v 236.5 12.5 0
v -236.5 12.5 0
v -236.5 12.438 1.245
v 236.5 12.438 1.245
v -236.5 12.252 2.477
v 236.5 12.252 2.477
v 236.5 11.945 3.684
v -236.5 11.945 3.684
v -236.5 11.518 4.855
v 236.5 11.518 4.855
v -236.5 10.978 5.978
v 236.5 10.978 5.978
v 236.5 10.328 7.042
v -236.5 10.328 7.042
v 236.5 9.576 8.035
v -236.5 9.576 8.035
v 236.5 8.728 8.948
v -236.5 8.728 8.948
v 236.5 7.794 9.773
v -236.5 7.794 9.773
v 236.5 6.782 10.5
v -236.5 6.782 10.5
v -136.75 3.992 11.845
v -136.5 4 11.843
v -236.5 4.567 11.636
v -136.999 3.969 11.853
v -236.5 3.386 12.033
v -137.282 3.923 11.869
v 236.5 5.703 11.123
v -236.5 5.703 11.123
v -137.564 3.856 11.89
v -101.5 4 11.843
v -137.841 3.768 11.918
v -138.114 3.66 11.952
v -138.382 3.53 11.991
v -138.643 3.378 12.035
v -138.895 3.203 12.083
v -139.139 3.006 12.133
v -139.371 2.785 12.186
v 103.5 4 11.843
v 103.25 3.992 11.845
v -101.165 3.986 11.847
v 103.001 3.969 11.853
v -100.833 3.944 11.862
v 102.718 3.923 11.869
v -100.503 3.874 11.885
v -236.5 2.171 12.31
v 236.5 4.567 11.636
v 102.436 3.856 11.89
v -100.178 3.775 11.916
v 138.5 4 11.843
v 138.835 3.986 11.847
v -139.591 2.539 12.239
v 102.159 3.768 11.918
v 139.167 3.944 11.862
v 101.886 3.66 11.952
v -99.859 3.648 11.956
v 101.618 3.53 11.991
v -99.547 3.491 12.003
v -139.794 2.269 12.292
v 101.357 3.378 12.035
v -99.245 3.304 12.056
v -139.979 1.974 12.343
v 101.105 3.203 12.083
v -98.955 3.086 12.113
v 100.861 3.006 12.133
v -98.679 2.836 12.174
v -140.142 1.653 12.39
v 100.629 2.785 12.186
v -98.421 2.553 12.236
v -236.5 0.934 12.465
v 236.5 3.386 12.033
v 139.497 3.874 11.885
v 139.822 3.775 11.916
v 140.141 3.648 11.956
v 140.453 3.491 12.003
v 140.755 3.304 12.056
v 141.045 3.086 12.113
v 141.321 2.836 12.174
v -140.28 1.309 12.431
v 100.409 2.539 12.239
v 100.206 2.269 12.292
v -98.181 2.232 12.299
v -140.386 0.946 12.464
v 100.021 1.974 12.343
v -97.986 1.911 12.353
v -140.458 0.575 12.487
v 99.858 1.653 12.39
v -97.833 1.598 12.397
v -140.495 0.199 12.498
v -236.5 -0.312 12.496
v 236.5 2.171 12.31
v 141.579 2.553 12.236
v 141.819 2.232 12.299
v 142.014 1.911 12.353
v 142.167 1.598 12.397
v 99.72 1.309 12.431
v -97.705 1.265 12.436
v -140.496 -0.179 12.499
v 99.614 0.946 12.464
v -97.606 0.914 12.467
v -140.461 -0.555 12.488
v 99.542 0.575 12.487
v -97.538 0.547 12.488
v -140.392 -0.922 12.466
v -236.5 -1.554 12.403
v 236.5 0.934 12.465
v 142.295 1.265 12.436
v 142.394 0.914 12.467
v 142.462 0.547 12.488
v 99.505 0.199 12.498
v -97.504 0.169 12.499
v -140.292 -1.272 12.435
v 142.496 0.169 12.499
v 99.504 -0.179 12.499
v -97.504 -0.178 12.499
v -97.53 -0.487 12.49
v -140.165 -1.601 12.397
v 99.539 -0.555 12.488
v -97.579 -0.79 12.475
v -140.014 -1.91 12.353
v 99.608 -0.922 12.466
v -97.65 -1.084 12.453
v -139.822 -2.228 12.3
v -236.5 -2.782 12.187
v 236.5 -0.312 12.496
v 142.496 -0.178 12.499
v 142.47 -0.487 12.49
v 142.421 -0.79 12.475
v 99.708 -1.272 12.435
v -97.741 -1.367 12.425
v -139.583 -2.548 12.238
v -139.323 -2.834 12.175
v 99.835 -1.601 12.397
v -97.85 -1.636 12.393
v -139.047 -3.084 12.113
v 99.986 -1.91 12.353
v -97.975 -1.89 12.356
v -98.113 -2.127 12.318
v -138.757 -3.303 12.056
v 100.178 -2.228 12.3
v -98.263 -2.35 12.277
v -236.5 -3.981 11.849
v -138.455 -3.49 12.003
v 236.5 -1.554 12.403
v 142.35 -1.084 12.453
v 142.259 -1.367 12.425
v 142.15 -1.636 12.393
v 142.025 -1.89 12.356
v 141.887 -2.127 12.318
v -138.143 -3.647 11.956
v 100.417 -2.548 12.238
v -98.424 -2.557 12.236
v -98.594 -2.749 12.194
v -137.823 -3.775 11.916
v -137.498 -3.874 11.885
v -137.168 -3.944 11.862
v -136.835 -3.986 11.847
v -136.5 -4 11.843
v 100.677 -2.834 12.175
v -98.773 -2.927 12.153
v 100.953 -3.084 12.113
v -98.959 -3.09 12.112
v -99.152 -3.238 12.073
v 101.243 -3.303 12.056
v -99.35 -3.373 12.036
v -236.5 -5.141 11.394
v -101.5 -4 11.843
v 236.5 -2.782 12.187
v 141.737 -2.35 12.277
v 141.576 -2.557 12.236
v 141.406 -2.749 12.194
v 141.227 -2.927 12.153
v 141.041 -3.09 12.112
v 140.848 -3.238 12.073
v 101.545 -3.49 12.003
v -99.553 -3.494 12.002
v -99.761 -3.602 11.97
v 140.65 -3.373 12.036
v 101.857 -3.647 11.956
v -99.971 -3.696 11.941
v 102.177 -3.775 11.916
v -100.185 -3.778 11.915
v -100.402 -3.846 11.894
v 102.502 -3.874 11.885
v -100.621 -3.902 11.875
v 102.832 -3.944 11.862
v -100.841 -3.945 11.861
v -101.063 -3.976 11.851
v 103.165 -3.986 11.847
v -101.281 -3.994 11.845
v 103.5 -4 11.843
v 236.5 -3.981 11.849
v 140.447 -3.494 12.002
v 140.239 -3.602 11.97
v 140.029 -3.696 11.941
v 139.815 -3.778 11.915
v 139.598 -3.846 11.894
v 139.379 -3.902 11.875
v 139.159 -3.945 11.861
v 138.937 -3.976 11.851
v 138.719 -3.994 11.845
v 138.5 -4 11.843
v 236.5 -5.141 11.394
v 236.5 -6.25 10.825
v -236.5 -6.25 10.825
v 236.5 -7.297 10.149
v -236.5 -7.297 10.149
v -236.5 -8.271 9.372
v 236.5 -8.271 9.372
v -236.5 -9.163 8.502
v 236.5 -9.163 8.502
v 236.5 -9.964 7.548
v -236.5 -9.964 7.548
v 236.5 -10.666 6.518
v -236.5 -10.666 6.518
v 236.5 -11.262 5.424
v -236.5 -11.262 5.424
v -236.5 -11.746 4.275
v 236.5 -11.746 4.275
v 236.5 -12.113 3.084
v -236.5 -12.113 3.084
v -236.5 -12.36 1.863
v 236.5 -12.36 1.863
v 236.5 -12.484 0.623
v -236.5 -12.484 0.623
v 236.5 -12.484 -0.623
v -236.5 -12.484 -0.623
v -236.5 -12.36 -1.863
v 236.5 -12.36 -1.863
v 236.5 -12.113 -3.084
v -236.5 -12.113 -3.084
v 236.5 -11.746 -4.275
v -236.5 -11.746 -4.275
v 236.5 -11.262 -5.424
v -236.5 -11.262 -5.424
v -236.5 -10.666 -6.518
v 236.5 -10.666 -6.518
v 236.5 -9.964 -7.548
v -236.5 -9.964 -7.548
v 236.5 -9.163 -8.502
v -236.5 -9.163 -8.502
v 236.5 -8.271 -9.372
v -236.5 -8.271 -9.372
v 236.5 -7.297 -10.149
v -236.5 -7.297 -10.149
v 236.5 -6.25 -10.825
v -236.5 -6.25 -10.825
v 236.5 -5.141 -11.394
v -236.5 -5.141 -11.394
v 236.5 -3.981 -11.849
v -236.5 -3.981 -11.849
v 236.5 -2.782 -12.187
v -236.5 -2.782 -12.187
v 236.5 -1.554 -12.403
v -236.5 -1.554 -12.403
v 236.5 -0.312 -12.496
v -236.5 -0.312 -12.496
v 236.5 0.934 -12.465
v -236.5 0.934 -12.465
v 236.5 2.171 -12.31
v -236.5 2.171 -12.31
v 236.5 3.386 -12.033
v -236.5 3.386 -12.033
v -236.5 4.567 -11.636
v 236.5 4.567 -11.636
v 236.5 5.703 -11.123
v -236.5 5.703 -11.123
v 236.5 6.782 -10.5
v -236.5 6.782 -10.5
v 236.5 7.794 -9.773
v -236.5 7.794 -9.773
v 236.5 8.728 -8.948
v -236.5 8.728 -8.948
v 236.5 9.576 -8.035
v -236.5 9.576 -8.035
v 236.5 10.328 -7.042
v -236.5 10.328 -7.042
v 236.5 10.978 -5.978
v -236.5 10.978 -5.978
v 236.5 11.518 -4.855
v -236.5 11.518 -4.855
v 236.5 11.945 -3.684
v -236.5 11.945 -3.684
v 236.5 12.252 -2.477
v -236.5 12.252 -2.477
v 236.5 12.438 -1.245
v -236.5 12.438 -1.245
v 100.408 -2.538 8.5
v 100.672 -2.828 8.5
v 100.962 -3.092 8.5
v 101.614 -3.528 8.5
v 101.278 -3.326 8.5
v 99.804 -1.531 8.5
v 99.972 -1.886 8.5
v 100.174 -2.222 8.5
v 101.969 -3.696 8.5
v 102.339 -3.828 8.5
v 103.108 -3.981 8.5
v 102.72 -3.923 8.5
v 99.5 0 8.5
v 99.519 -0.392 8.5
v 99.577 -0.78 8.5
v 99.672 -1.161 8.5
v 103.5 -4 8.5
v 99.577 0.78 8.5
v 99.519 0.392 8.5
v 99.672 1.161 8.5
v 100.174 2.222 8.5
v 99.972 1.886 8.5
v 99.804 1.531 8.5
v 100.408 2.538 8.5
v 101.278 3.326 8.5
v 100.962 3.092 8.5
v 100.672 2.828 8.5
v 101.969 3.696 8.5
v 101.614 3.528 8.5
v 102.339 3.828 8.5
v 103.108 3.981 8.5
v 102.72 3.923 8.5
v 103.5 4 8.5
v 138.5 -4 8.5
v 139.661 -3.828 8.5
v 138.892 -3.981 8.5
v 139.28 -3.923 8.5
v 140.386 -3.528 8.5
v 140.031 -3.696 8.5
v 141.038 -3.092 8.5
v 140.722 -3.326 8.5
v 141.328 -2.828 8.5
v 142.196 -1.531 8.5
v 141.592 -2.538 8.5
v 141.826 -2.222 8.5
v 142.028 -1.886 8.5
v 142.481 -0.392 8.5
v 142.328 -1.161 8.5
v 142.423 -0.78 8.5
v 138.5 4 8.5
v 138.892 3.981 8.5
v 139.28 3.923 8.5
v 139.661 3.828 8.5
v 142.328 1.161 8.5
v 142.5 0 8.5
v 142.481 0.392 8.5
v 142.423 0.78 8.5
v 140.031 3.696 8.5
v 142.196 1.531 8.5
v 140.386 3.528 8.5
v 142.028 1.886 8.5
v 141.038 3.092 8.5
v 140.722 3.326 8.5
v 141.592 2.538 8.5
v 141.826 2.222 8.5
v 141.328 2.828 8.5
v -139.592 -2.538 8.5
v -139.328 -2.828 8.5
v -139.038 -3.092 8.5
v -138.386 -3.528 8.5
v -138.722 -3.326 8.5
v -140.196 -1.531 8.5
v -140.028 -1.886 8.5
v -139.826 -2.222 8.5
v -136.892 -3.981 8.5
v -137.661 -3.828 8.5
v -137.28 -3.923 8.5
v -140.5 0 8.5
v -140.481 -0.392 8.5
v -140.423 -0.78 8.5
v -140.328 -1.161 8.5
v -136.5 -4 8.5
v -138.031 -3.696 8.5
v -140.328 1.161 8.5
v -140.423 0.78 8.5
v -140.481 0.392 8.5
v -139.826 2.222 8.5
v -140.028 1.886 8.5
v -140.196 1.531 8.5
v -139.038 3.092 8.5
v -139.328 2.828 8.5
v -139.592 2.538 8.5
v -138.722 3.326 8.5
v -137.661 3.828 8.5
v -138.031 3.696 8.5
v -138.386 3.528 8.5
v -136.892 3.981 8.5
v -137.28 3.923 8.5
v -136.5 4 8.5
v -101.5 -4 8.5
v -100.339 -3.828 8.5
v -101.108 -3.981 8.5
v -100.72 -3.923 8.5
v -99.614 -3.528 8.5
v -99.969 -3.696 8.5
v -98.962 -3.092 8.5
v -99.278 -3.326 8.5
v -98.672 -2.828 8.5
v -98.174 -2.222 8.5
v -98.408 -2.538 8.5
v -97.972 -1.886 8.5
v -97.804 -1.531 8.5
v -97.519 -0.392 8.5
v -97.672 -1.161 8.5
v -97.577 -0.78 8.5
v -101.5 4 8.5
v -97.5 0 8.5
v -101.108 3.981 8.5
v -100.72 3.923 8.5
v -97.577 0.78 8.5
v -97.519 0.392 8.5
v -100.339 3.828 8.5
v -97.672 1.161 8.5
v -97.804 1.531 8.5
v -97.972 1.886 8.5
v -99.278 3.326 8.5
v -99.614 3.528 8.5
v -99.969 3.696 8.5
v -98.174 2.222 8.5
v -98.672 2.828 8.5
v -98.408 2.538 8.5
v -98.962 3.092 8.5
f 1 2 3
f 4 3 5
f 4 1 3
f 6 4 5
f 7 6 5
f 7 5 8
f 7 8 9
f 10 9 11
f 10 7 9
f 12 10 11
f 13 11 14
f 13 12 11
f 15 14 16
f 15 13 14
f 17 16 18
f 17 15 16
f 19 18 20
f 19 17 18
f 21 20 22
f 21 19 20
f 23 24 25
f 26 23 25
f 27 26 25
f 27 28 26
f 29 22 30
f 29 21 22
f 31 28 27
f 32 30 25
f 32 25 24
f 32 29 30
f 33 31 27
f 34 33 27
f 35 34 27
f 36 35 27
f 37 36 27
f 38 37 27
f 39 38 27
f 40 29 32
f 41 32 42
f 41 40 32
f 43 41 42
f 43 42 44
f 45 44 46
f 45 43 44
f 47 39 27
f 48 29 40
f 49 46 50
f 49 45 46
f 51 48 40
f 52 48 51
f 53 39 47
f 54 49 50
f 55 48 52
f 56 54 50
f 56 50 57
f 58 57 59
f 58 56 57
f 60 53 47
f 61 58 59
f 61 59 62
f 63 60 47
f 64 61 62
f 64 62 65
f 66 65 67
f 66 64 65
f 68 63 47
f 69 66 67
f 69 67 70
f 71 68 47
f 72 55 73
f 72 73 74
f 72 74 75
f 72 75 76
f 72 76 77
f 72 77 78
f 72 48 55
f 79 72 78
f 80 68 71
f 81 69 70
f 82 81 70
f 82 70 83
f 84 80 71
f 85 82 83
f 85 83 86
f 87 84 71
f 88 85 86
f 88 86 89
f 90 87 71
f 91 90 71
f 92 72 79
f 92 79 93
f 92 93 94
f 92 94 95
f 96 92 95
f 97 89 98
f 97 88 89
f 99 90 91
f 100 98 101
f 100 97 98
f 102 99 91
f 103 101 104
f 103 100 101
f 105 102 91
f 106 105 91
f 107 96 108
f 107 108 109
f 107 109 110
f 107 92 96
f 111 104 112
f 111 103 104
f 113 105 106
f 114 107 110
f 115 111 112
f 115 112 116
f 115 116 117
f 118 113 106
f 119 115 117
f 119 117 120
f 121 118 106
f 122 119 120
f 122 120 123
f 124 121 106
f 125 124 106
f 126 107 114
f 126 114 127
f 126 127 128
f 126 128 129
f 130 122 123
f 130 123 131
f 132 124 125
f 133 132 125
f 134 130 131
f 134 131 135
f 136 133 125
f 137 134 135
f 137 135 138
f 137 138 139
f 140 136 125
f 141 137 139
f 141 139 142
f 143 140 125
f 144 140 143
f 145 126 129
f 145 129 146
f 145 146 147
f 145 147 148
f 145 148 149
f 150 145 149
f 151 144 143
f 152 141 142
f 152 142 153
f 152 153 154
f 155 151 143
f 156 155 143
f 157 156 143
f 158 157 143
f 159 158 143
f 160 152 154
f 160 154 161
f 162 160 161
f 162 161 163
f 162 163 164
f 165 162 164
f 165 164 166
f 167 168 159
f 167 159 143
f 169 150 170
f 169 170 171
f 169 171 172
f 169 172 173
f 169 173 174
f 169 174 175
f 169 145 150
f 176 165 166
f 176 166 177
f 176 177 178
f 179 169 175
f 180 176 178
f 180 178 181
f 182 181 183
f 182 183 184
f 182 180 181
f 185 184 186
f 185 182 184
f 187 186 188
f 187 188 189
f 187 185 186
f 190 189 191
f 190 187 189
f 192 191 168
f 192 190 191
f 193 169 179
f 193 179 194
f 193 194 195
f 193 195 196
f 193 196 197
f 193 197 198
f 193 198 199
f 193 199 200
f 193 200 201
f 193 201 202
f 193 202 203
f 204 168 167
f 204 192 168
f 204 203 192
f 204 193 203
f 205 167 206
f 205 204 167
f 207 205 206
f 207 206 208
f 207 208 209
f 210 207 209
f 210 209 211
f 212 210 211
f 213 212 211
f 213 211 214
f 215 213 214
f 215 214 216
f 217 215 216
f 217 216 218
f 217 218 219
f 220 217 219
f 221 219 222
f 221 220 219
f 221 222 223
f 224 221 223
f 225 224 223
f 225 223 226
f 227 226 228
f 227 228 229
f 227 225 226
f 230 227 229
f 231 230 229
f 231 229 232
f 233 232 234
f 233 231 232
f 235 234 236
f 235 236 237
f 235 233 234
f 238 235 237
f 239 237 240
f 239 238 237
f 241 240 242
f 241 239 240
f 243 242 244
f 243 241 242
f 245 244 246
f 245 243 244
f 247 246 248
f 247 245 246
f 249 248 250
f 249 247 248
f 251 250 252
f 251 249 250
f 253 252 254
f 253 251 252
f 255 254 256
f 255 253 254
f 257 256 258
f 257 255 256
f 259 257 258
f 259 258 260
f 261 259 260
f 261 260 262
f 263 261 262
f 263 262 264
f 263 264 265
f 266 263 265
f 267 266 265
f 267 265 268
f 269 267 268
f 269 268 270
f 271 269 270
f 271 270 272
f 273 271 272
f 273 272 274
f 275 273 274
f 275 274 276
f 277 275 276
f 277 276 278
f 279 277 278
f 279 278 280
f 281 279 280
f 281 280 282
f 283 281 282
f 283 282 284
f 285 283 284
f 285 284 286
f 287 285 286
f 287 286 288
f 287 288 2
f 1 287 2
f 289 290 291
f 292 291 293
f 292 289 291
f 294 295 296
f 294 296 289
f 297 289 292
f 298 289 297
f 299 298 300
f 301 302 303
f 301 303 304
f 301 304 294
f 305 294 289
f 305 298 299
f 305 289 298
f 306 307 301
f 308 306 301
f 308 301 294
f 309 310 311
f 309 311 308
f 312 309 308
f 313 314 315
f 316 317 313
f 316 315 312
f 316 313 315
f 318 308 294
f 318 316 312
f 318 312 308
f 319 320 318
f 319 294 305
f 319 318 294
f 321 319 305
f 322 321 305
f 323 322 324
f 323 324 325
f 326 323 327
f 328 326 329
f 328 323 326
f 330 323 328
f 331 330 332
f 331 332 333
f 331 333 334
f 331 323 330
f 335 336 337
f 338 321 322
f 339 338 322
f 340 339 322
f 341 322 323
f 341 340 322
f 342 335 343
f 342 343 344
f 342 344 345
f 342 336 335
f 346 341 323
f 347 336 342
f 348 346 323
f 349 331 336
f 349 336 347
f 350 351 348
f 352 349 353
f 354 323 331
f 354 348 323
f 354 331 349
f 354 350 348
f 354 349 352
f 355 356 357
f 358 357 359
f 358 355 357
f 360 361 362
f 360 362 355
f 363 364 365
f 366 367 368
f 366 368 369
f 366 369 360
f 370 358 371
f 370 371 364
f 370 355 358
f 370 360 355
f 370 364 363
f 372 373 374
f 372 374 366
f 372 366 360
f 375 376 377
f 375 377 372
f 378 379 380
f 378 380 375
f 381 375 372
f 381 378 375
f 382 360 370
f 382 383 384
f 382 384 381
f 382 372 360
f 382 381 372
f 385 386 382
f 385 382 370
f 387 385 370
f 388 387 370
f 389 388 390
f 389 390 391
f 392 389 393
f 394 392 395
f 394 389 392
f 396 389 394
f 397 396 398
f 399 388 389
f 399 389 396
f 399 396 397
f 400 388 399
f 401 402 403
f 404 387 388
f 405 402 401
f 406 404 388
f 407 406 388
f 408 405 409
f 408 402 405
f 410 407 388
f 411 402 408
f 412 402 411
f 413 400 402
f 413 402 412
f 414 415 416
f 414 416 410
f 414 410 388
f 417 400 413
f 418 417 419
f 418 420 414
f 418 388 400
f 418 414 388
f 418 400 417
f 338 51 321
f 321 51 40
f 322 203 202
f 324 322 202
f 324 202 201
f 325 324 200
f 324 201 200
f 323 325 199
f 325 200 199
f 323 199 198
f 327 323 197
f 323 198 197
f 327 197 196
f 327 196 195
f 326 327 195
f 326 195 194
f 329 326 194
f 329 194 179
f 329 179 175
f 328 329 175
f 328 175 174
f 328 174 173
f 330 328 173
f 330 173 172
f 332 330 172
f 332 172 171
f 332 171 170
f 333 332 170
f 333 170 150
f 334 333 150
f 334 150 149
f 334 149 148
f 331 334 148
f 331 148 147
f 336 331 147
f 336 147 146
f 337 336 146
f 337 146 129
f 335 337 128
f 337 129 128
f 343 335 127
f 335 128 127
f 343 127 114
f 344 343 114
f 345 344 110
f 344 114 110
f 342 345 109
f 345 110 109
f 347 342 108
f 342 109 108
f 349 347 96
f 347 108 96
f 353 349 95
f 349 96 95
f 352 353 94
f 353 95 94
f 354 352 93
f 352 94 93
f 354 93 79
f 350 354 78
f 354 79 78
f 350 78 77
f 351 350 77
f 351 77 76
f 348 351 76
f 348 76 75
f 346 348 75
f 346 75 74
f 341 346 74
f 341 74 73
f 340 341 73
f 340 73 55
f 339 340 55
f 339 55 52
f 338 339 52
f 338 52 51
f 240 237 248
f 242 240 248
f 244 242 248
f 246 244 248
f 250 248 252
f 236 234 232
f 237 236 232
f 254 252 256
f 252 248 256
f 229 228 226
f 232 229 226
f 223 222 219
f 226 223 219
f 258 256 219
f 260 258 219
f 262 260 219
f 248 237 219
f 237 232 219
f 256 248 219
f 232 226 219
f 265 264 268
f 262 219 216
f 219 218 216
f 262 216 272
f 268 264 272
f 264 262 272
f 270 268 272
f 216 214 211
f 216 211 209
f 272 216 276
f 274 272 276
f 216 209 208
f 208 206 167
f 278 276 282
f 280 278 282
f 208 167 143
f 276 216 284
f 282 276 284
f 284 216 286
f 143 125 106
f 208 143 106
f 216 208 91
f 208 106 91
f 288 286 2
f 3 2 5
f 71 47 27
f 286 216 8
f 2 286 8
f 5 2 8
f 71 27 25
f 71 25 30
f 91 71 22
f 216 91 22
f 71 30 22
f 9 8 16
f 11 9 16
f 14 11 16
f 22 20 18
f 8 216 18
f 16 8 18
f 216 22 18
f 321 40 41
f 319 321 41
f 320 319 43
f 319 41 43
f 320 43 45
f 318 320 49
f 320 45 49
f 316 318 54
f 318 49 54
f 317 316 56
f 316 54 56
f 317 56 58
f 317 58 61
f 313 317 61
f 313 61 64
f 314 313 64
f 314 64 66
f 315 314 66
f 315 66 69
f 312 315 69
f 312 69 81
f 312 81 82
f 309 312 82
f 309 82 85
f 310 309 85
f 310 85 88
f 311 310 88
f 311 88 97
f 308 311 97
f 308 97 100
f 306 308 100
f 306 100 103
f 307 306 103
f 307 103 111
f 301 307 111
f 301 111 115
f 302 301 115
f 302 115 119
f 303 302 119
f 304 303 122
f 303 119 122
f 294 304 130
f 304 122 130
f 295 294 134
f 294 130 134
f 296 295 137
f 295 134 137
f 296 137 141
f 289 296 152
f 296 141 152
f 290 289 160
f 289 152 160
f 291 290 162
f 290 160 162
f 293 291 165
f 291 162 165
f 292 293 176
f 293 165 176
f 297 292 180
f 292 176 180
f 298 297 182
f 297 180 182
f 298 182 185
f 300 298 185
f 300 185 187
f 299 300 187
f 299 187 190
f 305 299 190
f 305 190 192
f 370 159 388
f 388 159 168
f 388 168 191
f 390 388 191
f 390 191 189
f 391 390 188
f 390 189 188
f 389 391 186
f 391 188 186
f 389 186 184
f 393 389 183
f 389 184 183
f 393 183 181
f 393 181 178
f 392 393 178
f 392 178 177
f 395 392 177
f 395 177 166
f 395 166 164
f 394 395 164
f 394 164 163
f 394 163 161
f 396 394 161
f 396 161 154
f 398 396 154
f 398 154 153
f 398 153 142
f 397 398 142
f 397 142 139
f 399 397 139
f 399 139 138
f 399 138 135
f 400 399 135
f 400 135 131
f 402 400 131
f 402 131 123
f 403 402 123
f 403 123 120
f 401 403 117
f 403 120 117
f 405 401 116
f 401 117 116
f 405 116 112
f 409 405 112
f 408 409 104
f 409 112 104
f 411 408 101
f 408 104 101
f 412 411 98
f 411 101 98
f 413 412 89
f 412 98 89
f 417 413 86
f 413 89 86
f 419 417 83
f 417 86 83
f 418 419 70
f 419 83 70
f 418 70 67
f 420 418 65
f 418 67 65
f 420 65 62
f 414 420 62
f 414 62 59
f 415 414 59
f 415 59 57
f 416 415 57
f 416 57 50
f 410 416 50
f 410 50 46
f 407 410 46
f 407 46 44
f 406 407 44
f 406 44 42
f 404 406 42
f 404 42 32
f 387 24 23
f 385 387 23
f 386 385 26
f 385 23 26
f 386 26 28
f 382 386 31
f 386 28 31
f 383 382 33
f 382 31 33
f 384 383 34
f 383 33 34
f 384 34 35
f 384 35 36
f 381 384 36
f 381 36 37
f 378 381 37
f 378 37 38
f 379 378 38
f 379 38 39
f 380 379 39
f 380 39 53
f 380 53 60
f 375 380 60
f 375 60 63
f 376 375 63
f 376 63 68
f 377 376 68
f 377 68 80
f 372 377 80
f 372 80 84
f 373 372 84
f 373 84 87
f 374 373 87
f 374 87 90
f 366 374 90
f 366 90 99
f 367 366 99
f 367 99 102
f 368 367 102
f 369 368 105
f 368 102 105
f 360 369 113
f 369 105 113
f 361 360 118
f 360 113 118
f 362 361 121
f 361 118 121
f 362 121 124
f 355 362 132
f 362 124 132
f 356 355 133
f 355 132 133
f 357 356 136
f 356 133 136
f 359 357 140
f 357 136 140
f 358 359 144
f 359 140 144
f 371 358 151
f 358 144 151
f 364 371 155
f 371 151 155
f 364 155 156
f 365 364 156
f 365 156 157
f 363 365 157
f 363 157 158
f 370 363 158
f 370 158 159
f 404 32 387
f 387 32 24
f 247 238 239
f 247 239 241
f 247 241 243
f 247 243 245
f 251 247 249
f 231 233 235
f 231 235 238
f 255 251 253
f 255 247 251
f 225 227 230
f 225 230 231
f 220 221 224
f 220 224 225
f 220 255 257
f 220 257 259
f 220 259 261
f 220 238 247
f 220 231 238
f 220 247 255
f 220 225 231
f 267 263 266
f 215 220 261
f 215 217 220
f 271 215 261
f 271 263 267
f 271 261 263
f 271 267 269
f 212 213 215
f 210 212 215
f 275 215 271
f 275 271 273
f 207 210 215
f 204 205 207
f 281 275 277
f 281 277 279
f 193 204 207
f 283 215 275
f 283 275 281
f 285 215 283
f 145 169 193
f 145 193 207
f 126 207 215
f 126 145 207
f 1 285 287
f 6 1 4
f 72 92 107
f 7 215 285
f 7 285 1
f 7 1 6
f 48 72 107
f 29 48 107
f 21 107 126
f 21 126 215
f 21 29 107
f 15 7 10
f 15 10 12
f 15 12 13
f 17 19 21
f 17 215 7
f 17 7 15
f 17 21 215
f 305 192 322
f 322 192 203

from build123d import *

# Parameters (mm, degrees)
F0_R     = 12.5
F2_DEPTH = 236.5
F4_DEPTH = 4


with BuildPart() as f2:
    # F0 (on Right) → F2 (new body, symmetric)
    with BuildSketch(Plane.YZ):
        Circle(F0_R)
    extrude(amount=F2_DEPTH, both=True)

    # F3 (on offset) → F4 (cut)
    with BuildSketch(Plane.XY.offset(12.5)):
        with BuildLine():
            ThreePointArc((-136.5, 4), (-140.5, 0), (-136.5, -4))
            Line((-136.5, -4), (-101.5, -4))
            ThreePointArc((-101.5, -4), (-97.5, 0), (-101.5, 4))
            Line((-101.5, 4), (-136.5, 4))
        make_face()
        with BuildLine():
            ThreePointArc((103.5, 4), (99.5, 0), (103.5, -4))
            Line((103.5, -4), (138.5, -4))
            ThreePointArc((138.5, -4), (142.5, 0), (138.5, 4))
            Line((138.5, 4), (103.5, 4))
        make_face()
    extrude(amount=-F4_DEPTH, mode=Mode.SUBTRACT)


solid = f2.part
